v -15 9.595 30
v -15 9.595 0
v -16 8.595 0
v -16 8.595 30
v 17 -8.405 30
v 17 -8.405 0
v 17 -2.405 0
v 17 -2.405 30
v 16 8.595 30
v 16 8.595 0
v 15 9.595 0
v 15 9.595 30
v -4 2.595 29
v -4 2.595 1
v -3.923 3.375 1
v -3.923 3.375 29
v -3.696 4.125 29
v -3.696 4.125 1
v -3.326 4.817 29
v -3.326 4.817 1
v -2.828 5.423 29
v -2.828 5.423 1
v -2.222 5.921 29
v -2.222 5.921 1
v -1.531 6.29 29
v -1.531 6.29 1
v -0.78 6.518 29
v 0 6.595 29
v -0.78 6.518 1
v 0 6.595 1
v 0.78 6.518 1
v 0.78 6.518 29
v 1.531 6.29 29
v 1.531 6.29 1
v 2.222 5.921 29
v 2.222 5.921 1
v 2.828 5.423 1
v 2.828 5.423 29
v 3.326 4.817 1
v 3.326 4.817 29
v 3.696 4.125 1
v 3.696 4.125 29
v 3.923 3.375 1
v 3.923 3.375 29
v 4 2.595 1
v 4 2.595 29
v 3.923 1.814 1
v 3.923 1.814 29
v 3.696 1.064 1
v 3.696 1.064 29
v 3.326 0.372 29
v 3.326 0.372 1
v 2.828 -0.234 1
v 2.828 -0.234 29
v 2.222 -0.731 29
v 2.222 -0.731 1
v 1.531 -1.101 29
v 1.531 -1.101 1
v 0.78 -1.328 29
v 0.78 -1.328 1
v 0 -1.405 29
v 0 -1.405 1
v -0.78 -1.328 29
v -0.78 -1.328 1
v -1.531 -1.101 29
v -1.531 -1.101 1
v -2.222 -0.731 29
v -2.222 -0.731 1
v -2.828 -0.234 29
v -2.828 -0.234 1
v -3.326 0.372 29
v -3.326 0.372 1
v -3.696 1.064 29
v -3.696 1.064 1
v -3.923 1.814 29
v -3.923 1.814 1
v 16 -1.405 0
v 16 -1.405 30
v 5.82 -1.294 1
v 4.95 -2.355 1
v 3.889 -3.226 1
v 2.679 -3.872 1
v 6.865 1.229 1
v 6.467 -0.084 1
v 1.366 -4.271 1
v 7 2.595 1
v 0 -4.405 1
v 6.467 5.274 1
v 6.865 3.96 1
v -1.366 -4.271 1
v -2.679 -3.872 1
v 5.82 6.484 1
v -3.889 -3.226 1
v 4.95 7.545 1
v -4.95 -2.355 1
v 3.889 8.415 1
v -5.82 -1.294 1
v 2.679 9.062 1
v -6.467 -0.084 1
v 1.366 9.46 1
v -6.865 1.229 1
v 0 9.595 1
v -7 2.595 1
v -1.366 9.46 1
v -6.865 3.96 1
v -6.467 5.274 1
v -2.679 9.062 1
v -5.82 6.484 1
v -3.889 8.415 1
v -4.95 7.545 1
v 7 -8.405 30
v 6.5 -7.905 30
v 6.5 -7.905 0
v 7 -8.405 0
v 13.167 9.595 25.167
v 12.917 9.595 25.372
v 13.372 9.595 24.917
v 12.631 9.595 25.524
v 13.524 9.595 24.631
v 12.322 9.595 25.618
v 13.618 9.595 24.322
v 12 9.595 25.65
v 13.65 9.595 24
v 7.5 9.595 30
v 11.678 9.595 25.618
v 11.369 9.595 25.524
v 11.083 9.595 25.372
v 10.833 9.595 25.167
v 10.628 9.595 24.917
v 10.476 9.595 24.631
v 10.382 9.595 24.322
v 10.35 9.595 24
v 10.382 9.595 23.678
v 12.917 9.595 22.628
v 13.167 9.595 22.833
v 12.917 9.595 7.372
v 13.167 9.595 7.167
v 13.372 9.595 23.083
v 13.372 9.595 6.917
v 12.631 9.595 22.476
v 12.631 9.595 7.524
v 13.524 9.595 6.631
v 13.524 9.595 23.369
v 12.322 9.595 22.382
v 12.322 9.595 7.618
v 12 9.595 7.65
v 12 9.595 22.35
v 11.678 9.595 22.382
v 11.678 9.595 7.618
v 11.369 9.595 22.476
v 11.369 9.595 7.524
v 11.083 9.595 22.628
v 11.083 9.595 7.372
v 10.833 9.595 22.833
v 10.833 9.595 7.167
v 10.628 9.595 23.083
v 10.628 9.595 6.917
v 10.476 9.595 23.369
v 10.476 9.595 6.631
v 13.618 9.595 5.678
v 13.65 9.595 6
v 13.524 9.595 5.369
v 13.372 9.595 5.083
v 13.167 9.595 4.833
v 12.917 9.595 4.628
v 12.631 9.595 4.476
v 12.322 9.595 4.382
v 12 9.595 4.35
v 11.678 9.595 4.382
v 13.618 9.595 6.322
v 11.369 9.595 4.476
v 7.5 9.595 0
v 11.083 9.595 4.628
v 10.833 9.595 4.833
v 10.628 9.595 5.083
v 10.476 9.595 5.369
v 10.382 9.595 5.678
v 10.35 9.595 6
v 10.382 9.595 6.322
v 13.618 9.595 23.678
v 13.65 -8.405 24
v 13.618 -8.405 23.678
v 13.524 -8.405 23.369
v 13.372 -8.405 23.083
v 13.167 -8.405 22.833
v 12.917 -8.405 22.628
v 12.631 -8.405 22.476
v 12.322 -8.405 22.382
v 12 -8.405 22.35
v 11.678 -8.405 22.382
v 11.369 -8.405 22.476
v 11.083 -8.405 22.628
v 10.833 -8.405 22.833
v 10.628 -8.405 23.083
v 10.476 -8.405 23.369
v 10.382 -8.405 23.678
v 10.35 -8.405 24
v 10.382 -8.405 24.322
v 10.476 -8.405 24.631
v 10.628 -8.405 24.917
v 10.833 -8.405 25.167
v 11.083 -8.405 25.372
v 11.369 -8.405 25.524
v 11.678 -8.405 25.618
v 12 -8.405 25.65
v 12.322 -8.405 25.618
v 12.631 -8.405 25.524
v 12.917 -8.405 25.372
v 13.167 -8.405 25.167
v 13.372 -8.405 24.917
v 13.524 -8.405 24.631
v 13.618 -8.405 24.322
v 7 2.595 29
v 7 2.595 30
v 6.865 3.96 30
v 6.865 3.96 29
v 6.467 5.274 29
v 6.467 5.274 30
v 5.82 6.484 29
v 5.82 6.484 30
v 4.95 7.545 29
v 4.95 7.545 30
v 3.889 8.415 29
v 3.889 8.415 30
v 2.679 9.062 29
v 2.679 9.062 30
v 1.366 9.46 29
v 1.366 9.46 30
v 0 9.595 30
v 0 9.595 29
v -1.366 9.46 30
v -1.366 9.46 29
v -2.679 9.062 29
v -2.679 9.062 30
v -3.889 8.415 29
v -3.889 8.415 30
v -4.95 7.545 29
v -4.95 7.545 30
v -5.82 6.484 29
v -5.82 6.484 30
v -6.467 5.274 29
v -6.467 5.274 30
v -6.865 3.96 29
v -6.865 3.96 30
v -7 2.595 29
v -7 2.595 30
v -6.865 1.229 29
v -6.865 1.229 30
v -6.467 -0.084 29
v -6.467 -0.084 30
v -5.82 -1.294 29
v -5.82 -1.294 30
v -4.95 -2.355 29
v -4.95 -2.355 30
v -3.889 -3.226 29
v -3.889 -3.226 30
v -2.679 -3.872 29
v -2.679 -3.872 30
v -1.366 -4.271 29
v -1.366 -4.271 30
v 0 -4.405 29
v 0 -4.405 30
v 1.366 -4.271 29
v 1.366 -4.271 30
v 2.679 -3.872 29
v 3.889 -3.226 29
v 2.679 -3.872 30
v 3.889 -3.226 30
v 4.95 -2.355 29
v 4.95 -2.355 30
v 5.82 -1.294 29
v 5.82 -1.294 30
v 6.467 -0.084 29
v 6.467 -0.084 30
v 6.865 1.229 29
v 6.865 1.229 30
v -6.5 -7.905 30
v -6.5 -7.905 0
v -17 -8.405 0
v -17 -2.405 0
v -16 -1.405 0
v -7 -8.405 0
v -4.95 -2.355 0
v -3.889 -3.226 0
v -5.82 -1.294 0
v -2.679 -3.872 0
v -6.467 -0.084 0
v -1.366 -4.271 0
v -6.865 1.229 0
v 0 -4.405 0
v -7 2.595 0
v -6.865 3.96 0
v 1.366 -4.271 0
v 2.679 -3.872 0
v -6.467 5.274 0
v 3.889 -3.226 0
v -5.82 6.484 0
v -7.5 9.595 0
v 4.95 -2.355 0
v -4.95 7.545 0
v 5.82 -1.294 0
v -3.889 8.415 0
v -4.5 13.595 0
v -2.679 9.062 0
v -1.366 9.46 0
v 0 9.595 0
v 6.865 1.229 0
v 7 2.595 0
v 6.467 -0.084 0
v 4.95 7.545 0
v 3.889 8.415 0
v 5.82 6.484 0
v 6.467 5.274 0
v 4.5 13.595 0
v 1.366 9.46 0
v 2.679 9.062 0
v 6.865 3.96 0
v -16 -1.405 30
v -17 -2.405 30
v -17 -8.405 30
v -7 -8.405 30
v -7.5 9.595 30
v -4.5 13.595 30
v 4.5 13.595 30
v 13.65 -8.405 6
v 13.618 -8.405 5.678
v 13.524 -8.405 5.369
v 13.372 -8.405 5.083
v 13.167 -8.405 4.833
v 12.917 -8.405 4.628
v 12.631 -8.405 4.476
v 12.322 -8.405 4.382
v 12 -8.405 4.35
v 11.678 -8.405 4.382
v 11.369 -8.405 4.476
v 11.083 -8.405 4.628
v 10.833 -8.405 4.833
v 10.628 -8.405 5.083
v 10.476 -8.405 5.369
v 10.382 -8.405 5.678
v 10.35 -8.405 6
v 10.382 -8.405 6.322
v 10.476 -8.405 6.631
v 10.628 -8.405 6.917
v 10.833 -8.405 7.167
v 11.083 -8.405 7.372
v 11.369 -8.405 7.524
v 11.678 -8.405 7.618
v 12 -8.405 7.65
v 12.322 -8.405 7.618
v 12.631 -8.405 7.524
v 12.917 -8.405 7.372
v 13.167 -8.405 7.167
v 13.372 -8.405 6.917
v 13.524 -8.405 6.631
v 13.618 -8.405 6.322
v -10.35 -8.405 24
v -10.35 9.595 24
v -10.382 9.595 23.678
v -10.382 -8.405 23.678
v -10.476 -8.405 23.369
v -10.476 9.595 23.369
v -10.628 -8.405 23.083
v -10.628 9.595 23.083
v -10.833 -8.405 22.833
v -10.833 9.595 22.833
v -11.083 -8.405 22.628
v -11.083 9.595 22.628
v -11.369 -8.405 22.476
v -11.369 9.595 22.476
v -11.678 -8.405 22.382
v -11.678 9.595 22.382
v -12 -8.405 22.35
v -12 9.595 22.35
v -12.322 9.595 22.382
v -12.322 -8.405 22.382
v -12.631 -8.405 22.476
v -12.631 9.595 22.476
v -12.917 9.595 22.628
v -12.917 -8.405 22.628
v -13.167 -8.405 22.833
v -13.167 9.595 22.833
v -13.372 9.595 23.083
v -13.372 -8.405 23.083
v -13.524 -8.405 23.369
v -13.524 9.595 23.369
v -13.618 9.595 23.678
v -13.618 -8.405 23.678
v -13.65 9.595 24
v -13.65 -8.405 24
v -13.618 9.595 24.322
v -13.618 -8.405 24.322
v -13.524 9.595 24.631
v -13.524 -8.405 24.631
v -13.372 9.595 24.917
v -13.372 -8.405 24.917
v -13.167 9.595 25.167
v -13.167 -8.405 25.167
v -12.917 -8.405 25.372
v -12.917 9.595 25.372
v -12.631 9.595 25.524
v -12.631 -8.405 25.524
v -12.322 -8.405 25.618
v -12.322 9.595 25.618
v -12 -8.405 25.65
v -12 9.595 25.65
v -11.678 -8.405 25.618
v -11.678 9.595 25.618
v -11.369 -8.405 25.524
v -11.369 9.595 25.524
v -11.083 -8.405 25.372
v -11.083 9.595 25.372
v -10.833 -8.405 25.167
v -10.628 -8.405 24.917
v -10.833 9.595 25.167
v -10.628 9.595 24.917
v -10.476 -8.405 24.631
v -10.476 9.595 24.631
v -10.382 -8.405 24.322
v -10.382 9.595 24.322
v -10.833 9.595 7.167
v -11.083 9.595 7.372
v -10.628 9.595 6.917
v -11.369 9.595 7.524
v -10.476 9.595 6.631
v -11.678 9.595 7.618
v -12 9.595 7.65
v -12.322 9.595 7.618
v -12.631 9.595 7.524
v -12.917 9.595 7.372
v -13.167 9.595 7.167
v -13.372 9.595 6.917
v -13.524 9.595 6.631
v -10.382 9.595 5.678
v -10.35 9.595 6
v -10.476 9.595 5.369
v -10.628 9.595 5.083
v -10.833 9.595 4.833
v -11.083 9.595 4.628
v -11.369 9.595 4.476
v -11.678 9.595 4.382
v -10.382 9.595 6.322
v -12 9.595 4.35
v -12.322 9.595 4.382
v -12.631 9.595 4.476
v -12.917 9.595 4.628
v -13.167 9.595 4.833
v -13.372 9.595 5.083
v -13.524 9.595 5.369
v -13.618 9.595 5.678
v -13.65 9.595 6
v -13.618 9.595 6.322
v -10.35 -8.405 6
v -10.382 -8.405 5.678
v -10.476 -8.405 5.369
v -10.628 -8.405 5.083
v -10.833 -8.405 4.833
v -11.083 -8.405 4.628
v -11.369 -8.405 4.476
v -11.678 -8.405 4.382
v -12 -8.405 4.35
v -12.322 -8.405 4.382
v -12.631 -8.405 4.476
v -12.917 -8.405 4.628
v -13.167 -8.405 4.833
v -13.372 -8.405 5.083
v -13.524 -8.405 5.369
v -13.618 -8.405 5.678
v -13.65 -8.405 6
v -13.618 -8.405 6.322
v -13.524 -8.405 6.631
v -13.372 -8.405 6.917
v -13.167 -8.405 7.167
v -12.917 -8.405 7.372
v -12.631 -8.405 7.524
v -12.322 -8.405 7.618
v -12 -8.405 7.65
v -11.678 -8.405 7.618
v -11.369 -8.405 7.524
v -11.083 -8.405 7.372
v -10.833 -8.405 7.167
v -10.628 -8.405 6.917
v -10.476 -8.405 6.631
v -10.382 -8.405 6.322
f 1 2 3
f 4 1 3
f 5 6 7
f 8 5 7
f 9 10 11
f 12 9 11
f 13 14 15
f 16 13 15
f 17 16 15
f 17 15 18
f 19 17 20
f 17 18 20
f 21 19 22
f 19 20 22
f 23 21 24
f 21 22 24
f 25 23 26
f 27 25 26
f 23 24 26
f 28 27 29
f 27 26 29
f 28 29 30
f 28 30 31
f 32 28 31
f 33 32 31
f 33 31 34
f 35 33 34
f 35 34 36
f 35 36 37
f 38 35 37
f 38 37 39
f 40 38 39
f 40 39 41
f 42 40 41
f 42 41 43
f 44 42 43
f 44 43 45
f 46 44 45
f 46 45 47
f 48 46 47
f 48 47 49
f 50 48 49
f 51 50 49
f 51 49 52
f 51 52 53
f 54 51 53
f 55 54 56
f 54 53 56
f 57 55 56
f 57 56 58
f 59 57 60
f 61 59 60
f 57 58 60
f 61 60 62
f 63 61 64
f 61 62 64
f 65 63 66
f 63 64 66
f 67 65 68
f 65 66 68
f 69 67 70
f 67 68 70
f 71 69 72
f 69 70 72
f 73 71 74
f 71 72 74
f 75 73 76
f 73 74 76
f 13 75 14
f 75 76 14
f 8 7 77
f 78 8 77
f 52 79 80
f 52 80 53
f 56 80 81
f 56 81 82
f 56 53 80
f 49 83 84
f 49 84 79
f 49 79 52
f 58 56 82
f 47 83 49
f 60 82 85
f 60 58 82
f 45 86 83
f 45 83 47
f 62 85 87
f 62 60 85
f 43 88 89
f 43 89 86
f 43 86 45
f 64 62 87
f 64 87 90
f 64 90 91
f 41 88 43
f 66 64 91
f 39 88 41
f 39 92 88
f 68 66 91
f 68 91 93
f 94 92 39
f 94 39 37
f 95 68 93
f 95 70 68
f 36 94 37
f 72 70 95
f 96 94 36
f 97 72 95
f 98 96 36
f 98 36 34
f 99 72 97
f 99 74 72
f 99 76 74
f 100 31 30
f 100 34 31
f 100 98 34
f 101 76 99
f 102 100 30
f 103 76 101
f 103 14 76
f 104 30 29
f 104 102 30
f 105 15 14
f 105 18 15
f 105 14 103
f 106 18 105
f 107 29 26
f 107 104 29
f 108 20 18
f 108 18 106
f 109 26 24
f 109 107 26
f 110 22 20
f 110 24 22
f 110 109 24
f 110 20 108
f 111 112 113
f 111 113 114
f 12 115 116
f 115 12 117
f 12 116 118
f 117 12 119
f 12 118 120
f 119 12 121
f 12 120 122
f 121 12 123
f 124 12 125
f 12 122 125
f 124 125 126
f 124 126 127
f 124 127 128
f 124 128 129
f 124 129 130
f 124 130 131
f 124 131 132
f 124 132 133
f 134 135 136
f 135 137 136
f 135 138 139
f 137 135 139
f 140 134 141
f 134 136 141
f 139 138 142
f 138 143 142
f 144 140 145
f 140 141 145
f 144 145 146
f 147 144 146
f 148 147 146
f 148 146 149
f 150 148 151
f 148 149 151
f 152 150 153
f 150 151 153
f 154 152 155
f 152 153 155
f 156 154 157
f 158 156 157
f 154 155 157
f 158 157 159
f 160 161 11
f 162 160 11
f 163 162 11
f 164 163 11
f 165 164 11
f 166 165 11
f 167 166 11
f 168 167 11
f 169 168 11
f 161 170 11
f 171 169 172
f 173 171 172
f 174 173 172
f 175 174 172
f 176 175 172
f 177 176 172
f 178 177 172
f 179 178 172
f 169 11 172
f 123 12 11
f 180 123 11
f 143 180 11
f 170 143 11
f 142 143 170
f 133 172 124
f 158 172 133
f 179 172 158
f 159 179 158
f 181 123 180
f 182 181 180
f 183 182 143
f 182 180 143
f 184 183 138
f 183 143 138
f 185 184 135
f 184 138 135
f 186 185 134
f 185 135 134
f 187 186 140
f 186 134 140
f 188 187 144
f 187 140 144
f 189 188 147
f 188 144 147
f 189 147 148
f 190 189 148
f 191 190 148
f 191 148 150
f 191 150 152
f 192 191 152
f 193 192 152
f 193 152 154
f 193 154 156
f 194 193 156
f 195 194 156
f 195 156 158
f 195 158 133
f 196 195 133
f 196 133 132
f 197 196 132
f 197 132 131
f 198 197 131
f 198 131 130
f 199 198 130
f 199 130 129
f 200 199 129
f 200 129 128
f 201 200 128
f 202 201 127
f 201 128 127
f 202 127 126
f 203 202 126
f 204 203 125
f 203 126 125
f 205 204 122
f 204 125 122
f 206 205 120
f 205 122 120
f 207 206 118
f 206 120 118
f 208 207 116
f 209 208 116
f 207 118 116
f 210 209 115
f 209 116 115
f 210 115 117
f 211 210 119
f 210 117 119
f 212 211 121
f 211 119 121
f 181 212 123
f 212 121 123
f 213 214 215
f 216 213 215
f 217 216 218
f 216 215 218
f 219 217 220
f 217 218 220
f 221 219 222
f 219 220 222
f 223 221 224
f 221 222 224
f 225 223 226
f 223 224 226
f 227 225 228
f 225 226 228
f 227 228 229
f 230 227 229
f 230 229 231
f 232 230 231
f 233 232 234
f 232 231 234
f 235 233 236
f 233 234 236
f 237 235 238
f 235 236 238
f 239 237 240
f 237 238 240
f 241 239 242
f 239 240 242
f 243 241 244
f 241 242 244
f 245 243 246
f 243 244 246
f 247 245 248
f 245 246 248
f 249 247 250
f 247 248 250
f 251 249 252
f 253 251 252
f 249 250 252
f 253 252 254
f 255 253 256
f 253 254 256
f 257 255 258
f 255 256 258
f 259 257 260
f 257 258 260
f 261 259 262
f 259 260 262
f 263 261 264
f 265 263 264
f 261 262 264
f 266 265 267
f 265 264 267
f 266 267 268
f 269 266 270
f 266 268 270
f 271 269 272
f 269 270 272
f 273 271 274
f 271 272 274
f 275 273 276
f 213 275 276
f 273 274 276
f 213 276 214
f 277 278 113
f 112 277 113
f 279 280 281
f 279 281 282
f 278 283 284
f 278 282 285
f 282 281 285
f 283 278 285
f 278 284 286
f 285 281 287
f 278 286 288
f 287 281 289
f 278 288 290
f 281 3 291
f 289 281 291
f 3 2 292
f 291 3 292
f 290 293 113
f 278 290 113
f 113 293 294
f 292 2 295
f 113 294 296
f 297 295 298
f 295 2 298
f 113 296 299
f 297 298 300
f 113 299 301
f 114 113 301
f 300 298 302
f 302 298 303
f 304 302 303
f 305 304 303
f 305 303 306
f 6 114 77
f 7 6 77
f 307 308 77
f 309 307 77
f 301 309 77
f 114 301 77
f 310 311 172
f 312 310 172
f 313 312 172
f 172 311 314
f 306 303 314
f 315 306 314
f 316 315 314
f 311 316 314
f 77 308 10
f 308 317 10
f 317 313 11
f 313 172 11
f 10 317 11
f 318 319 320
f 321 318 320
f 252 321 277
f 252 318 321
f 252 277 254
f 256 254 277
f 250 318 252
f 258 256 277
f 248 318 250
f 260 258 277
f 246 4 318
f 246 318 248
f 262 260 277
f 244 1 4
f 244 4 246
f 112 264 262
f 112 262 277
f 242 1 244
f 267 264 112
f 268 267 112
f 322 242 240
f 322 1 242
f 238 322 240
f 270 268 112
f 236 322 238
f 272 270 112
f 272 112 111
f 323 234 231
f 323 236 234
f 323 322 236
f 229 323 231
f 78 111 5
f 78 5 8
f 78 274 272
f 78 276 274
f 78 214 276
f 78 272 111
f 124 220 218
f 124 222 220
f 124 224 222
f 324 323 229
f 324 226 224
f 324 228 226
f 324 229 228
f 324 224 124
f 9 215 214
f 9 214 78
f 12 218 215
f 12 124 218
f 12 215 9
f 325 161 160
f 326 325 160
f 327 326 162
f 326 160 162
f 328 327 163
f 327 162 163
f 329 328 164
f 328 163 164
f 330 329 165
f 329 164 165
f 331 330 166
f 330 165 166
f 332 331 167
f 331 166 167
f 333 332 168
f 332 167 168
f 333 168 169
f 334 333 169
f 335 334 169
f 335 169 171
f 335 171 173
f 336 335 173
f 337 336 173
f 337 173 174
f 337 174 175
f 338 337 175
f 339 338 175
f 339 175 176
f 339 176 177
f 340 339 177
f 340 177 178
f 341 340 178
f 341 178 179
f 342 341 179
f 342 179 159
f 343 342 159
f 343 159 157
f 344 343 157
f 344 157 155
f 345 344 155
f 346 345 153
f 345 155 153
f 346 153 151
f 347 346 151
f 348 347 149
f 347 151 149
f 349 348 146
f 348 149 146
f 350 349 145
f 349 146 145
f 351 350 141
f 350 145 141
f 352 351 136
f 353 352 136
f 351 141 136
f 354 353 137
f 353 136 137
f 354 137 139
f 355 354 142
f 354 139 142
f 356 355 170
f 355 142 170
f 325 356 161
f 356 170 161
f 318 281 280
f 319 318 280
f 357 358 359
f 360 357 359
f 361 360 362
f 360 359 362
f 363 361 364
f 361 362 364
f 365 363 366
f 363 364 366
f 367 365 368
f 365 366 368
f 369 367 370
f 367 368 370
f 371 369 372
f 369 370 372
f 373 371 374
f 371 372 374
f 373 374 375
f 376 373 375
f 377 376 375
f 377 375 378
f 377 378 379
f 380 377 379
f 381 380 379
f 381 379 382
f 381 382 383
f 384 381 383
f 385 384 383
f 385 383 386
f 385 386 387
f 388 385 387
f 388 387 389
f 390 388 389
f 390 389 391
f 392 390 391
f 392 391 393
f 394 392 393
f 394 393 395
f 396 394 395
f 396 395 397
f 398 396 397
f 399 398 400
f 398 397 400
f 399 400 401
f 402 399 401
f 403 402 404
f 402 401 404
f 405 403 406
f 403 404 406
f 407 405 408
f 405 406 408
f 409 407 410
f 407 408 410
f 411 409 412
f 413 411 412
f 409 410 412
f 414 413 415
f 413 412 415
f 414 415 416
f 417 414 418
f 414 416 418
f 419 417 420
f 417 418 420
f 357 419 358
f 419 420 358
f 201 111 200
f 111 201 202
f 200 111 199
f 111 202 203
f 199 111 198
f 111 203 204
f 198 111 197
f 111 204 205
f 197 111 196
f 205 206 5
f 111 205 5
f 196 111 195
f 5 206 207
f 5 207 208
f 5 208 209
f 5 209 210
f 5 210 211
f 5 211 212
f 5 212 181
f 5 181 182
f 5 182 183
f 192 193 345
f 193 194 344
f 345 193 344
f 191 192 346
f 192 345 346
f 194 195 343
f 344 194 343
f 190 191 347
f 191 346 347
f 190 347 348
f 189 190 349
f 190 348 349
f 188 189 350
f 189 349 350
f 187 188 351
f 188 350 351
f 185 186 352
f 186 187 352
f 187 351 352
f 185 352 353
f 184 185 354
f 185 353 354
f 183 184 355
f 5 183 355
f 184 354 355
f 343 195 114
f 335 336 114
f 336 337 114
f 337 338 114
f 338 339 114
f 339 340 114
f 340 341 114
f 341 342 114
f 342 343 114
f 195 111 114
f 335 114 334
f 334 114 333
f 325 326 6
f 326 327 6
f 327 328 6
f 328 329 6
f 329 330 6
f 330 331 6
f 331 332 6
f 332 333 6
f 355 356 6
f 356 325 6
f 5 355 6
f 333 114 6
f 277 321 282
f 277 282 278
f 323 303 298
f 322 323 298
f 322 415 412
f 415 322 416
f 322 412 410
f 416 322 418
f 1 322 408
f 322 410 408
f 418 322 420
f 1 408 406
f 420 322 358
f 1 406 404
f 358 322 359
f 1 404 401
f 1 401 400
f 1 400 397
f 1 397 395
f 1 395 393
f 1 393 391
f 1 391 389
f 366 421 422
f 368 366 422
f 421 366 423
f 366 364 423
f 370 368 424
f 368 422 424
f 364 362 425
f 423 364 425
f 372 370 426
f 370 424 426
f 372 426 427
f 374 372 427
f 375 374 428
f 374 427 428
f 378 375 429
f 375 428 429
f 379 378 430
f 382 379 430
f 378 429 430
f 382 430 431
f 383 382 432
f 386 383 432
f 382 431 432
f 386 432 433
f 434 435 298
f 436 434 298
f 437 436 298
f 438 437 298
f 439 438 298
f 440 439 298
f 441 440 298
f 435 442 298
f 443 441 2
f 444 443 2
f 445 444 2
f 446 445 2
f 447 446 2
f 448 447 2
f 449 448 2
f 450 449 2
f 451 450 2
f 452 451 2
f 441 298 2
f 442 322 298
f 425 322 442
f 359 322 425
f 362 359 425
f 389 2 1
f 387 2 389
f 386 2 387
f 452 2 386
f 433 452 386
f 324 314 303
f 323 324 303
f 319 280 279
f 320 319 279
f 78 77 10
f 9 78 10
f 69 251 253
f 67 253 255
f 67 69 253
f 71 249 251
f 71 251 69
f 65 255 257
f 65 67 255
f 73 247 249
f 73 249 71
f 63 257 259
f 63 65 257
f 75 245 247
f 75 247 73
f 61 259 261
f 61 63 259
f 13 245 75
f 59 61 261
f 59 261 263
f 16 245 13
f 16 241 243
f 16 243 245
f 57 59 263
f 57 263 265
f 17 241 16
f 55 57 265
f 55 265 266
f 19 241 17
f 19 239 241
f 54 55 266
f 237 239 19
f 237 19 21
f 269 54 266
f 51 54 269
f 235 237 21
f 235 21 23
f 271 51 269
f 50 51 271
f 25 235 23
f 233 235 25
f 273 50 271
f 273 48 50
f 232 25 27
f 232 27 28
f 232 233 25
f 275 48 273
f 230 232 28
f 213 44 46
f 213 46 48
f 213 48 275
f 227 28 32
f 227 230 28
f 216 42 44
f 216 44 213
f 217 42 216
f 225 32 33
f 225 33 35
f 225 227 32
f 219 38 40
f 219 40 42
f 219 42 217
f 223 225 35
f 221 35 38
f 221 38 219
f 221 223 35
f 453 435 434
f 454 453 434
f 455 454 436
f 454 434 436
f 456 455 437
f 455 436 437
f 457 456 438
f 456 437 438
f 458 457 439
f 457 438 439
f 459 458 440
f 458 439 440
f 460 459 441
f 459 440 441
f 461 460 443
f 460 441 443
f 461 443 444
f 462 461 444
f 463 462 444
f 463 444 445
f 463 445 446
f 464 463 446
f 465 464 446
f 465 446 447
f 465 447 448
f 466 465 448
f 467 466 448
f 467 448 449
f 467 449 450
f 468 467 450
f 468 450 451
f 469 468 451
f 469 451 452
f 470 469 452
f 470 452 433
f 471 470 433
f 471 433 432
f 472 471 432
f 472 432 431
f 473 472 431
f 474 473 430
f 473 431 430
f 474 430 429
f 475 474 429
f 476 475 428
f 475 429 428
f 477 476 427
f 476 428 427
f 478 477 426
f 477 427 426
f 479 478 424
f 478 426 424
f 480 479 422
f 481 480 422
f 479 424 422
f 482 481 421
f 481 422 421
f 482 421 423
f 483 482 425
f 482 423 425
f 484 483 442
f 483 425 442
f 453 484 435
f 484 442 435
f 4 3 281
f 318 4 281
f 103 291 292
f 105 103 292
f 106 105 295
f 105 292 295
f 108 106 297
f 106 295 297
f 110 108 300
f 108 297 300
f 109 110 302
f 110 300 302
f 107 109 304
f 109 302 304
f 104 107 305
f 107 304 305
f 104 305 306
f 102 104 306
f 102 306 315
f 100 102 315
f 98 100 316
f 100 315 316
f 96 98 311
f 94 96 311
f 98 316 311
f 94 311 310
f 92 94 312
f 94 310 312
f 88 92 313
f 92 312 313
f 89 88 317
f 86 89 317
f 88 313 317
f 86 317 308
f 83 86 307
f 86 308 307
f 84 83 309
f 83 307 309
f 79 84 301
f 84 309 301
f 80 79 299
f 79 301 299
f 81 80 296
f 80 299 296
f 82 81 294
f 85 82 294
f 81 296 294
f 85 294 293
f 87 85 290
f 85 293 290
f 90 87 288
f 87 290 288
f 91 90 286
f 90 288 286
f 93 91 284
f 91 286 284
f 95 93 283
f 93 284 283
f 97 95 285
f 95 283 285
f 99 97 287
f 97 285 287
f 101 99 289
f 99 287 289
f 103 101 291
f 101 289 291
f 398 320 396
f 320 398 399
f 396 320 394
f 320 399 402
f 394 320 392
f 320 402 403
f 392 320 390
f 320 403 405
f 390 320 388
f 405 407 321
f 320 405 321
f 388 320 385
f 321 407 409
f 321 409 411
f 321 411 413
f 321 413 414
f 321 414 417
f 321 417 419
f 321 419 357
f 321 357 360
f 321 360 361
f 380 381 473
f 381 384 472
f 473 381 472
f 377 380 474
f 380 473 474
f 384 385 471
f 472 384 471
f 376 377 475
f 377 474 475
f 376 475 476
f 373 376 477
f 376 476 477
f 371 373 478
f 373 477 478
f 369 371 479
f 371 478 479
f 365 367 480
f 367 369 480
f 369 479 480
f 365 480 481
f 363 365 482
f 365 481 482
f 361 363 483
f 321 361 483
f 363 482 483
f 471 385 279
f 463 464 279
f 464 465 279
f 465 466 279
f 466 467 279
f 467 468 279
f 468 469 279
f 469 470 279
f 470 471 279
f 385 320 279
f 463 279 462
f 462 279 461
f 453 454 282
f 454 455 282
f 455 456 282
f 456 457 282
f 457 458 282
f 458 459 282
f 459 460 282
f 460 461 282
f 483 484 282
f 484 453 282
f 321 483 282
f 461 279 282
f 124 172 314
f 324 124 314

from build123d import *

# Parameters (mm, degrees)
BOSS_EXTRUDE1_DEPTH         = 30
SKETCH2_R                   = 4
CUT_EXTRUDE1_DEPTH          = 31
SKETCH3_R                   = 7
CUT_EXTRUDE2_DEPTH          = 1
SKETCH4_R                   = 7
CUT_EXTRUDE3_DEPTH          = 1
TAP_DRILL_FOR_M4X0_7_TAP1_D = 3.3


with BuildPart() as part:
    # Sketch1 → Boss-Extrude1 (new body)
    with BuildSketch(Plane.XY):
        Polygon((-17, -2.405243596), (-17, -8.405243596), (-7, -8.405243596), (-6.5, -7.905243596), (6.5, -7.905243596), (7, -8.405243596), (17, -8.405243596), (17, -2.405243596), (16, -1.405243596), (16, 8.594756404), (15, 9.594756404), (7.5, 9.594756404), (4.5, 13.594756404), (-4.5, 13.594756404), (-7.5, 9.594756404), (-15, 9.594756404), (-16, 8.594756404), (-16, -1.405243596), align=None)
    extrude(amount=BOSS_EXTRUDE1_DEPTH)

    # Sketch2 → Cut-Extrude1 (cut, through all)
    with BuildSketch(Plane(origin=(0, 0, 0), x_dir=(-1, 0, 0), z_dir=(0, 0, -1))):
        with Locations((0, 2.594756404)):
            Circle(SKETCH2_R)
    extrude(amount=-CUT_EXTRUDE1_DEPTH, mode=Mode.SUBTRACT)

    # Sketch3 → Cut-Extrude2 (cut)
    with BuildSketch(Plane(origin=(0, 0, 0), x_dir=(-1, 0, 0), z_dir=(0, 0, -1))):
        with Locations((0, 2.594756404)):
            Circle(SKETCH3_R)
    extrude(amount=-CUT_EXTRUDE2_DEPTH, mode=Mode.SUBTRACT)

    # Sketch4 → Cut-Extrude3 (cut)
    with BuildSketch(Plane.XY.offset(30)):
        with Locations((0, 2.594756404)):
            Circle(SKETCH4_R)
    extrude(amount=-CUT_EXTRUDE3_DEPTH, mode=Mode.SUBTRACT)

    # Tap Drill for M4x0.7 Tap1 (through all)
    with Locations(Plane(origin=(0, -8.405243596, 0), x_dir=(-1, 0, 0), z_dir=(0, -1, 0))):
        with Locations((-12, -6), (12, -6), (12, -24), (-12, -24)):
            Hole(TAP_DRILL_FOR_M4X0_7_TAP1_D / 2)


solid = part.part
